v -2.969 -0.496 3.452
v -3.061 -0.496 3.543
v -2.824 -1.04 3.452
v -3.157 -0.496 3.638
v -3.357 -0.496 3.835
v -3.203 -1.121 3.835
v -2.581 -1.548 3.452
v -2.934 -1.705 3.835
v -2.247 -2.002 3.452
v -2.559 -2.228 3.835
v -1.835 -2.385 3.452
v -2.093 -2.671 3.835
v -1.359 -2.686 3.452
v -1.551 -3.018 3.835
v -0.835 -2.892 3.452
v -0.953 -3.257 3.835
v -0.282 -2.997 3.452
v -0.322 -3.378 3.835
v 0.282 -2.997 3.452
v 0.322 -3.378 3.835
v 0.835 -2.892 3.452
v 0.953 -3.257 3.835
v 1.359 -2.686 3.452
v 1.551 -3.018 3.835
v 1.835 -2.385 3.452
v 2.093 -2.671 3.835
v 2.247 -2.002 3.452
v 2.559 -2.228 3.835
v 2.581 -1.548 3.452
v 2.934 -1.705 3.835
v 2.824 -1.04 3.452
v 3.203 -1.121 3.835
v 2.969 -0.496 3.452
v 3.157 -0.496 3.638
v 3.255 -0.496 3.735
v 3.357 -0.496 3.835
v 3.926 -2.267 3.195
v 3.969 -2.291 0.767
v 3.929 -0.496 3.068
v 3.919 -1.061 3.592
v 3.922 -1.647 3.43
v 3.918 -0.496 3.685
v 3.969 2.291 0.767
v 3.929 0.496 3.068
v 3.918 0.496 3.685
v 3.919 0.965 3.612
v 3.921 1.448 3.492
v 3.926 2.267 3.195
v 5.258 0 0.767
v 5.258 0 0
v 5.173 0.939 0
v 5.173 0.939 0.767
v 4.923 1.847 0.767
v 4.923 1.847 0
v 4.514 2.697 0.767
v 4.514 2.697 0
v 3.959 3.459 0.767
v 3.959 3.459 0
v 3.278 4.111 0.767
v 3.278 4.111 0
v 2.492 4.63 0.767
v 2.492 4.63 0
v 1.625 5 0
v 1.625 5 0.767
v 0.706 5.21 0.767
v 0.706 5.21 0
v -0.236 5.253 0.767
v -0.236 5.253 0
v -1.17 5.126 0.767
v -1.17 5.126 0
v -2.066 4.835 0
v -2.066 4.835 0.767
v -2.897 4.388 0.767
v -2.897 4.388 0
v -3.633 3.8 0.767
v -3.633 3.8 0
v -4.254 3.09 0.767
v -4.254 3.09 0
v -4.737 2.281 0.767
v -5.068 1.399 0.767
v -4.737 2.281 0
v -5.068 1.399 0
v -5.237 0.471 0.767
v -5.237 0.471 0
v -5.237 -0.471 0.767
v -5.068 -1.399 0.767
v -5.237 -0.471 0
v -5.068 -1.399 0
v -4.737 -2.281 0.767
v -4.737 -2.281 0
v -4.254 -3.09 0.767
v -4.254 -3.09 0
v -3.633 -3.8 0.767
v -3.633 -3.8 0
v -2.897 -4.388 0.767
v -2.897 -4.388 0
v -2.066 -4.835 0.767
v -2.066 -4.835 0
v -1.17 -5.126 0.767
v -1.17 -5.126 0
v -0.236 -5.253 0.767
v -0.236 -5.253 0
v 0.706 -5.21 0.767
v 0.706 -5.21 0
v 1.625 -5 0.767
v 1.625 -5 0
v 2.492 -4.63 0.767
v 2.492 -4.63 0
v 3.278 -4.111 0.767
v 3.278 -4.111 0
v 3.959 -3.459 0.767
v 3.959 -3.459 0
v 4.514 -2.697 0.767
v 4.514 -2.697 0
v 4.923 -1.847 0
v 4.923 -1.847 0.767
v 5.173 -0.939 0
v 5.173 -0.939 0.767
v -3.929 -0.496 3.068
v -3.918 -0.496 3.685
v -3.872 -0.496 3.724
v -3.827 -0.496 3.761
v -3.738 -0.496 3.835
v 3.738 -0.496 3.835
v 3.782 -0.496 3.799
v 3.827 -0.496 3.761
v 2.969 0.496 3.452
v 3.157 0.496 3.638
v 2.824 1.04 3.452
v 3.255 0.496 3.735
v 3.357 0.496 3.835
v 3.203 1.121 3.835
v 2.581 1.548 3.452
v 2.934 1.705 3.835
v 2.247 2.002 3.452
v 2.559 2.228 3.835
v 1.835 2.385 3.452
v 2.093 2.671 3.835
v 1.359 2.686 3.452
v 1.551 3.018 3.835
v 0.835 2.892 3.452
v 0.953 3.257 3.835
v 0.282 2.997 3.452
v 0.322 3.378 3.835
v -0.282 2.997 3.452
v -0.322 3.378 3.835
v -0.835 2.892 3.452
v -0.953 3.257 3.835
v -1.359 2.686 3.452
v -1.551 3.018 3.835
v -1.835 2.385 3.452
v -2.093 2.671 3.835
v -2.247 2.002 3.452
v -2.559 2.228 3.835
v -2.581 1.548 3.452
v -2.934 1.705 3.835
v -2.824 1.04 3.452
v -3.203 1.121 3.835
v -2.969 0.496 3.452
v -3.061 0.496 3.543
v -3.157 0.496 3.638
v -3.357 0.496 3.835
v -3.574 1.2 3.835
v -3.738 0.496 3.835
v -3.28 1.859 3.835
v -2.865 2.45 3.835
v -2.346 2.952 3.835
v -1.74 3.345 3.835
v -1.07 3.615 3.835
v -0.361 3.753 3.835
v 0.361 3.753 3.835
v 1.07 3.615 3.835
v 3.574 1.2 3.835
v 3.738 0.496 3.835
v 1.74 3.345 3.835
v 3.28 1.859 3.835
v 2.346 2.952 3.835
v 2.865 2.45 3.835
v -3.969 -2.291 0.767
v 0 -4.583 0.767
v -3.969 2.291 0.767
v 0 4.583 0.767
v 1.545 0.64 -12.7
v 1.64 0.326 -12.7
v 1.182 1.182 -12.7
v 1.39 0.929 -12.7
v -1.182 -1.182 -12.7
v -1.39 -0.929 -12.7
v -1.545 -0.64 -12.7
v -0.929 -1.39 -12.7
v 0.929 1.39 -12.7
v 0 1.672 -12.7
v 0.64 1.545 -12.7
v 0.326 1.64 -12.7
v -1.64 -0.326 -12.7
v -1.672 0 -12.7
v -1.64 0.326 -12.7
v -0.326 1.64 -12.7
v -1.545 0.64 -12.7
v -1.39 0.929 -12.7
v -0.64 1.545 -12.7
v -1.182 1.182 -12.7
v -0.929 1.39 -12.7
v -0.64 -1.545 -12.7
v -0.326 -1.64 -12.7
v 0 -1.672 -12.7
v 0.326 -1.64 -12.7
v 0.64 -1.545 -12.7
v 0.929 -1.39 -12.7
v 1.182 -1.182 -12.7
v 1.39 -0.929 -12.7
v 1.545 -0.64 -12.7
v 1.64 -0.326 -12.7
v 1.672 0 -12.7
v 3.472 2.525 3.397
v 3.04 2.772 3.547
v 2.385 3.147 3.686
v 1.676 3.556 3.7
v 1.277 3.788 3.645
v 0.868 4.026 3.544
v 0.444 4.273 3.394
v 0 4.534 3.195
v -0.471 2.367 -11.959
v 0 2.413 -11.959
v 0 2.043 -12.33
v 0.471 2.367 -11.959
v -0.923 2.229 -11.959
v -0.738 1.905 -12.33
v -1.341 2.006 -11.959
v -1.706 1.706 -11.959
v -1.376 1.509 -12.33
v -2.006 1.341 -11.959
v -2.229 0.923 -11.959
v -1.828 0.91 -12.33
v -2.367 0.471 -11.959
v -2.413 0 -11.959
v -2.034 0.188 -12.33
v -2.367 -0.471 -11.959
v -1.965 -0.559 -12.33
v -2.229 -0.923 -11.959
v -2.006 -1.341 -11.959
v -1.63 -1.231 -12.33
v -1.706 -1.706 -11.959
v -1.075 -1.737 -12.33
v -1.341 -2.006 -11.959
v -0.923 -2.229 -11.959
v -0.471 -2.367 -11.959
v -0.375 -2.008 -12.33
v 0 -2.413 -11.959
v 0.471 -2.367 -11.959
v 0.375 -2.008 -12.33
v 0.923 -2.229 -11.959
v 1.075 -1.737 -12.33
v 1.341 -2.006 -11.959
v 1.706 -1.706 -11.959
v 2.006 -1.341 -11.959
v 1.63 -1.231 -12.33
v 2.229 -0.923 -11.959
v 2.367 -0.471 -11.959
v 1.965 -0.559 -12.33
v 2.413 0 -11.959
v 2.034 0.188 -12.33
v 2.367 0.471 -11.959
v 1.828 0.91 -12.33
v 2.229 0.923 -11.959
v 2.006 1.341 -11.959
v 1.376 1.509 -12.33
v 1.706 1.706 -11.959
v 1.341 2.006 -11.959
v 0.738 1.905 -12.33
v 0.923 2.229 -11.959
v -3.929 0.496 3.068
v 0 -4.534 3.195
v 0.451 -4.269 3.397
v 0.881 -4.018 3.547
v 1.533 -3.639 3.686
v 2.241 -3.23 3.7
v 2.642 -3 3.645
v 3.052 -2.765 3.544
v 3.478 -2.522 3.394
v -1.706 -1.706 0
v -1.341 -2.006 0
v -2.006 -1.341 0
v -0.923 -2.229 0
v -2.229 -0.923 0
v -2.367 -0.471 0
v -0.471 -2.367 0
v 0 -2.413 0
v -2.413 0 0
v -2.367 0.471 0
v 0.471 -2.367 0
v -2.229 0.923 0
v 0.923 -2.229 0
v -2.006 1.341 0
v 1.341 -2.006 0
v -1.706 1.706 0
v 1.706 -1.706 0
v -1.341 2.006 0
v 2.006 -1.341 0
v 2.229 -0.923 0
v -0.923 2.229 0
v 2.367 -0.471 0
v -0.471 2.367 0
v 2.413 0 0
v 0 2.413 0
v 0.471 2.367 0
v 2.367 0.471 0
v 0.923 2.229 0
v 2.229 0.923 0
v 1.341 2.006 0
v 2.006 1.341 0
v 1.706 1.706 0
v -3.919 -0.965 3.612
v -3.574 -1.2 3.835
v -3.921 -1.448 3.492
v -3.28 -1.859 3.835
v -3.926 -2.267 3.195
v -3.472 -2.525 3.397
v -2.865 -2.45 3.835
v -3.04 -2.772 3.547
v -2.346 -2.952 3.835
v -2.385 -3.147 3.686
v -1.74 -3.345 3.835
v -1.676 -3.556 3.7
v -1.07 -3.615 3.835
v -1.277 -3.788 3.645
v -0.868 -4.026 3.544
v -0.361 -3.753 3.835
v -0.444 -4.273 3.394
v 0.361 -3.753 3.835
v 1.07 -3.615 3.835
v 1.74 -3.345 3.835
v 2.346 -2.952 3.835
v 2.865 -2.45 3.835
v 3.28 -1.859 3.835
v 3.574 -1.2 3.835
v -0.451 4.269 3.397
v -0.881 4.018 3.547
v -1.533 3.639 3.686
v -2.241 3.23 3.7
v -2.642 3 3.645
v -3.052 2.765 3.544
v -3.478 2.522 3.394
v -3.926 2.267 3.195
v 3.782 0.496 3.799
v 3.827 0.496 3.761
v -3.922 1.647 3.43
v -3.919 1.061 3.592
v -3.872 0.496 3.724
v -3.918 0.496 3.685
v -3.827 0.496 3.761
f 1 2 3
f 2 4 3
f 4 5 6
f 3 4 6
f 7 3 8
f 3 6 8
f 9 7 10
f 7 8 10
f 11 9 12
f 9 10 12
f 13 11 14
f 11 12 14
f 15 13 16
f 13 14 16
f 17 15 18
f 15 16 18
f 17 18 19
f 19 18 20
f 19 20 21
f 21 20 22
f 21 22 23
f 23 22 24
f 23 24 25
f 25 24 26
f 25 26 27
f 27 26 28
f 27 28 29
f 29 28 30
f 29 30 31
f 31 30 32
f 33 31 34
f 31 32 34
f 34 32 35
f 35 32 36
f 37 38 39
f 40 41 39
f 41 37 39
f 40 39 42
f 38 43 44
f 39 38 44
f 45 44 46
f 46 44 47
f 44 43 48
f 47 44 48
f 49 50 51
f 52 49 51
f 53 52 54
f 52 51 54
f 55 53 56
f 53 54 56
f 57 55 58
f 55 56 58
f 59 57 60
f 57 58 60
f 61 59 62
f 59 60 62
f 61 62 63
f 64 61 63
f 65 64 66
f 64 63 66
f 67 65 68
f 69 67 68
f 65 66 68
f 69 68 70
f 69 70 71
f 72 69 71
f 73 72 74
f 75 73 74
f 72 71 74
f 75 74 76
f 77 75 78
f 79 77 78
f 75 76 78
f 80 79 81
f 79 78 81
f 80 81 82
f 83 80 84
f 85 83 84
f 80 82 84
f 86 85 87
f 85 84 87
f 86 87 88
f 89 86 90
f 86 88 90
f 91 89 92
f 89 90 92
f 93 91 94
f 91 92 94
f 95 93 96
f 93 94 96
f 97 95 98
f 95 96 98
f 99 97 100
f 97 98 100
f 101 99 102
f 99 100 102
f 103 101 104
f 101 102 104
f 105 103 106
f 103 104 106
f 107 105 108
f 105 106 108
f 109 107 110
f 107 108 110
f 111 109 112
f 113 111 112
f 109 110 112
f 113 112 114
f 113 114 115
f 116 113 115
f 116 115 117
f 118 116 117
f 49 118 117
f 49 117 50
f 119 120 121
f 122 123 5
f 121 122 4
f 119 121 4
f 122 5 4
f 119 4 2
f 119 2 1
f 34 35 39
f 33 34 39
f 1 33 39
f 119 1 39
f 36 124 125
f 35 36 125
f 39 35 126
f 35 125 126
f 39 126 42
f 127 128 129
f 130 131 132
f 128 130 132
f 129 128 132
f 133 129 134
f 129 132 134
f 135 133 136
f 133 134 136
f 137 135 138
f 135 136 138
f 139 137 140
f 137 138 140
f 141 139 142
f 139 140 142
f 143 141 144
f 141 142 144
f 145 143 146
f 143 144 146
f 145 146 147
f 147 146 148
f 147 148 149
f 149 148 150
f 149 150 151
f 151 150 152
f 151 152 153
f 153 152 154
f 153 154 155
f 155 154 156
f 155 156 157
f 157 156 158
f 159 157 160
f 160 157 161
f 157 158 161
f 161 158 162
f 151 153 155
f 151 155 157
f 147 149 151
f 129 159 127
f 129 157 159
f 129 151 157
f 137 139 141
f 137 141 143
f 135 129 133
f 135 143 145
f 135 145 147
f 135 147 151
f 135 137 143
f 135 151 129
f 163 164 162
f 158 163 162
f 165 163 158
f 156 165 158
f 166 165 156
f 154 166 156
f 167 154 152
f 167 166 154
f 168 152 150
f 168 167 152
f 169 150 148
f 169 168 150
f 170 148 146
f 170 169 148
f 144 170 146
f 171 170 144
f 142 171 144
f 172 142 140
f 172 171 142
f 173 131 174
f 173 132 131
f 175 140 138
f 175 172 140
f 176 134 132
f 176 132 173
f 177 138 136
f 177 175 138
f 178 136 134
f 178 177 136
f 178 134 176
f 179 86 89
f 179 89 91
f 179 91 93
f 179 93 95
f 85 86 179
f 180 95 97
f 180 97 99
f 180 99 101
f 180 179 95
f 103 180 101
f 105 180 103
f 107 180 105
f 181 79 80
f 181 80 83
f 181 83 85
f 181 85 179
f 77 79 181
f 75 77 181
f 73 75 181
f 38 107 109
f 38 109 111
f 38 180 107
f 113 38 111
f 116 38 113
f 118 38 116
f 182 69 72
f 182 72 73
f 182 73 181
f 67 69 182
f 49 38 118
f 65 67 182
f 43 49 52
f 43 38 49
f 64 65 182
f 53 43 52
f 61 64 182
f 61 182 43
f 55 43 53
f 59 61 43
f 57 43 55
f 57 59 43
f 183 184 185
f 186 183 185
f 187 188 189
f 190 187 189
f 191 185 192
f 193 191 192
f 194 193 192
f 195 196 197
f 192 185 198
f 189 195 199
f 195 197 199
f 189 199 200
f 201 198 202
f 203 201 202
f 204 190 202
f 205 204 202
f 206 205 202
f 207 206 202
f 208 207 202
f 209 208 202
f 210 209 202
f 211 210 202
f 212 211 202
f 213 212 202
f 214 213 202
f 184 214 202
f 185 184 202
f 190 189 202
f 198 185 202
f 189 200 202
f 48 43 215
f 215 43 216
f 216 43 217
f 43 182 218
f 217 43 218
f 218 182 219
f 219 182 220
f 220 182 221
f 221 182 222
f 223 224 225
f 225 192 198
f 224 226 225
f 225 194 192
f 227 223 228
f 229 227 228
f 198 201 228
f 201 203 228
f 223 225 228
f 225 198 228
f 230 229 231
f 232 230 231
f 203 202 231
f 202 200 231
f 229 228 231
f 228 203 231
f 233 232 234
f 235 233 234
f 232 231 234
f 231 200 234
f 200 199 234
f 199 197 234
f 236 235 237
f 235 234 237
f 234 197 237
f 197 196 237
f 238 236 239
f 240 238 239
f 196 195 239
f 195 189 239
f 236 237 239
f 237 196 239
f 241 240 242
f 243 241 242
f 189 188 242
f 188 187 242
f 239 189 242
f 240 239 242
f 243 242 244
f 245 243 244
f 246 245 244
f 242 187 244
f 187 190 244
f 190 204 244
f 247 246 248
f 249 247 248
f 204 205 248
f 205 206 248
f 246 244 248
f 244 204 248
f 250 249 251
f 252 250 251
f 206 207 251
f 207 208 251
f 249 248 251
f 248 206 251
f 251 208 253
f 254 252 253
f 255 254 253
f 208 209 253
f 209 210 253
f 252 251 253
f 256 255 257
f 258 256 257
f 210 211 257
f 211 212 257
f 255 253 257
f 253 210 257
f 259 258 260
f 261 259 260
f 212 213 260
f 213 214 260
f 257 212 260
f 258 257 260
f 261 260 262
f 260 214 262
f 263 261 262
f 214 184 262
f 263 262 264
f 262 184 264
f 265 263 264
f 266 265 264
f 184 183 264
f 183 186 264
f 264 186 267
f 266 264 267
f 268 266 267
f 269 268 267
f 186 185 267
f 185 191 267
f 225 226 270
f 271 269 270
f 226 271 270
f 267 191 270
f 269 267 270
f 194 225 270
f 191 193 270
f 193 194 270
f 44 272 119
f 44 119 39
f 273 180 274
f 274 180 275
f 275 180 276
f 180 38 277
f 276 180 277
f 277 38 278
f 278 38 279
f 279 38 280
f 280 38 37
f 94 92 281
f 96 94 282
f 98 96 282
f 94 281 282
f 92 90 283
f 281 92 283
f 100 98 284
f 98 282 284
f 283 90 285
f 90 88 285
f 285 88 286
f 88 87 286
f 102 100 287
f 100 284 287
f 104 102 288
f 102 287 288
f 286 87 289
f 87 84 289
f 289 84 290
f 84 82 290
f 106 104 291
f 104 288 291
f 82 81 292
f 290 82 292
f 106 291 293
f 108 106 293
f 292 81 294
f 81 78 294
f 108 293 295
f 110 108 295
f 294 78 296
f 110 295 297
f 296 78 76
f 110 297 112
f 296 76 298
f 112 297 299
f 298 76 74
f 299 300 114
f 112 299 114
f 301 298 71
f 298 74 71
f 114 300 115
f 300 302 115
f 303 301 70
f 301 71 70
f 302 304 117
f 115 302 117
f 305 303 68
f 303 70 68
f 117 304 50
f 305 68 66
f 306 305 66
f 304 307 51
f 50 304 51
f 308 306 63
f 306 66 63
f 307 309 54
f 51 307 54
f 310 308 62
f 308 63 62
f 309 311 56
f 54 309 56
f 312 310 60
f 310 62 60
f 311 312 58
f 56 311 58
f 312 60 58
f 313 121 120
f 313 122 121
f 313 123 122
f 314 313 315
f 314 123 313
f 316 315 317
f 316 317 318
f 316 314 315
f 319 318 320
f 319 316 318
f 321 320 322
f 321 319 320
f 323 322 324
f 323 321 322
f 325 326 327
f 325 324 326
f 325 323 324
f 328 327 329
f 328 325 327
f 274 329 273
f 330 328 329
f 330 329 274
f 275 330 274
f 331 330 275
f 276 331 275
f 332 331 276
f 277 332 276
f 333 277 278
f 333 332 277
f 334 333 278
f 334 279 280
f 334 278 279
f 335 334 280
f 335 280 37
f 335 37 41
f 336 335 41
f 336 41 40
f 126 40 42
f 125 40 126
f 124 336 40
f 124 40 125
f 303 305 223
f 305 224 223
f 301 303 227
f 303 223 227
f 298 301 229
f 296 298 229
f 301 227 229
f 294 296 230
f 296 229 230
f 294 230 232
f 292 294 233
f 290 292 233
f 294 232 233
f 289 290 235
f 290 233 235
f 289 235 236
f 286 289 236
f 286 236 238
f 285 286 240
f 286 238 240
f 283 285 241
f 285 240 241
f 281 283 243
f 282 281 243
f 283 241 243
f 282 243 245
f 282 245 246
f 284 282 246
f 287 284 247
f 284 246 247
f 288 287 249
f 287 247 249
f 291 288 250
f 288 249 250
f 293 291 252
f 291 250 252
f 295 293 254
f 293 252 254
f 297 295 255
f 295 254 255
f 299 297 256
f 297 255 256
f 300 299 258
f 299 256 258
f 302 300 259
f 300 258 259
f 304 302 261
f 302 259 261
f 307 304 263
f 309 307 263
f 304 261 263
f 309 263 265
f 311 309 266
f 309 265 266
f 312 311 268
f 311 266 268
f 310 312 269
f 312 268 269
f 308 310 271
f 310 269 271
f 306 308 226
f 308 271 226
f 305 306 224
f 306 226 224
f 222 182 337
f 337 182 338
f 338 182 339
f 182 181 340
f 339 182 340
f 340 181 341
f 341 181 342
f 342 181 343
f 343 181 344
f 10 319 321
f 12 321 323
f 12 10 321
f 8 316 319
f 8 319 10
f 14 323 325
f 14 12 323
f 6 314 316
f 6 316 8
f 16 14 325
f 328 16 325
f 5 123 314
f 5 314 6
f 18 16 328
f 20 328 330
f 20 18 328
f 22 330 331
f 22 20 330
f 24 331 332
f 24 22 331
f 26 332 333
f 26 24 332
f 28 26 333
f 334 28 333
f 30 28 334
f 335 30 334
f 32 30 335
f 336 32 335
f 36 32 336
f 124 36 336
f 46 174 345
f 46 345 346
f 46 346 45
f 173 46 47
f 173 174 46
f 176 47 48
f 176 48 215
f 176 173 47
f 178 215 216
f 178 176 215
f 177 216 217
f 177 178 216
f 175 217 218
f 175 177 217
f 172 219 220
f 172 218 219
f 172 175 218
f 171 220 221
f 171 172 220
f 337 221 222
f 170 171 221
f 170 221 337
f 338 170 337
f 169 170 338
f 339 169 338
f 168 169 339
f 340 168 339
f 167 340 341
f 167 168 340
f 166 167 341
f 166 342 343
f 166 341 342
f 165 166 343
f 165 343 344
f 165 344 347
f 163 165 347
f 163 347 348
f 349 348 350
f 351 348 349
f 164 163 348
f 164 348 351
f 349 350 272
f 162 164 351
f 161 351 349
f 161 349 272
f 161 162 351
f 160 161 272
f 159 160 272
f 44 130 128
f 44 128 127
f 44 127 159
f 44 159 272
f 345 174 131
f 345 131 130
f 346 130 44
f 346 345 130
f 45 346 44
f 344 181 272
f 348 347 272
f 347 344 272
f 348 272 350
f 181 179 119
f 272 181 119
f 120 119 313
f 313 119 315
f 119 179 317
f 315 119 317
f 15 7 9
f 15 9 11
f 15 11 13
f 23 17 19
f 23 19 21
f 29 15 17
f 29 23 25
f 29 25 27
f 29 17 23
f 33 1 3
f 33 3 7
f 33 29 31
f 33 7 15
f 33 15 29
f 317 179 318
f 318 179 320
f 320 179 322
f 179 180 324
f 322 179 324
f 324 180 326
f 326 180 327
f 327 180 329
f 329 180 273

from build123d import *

# Parameters (mm, degrees)
SKETCH3_R           = 5.2578
BOSS_EXTRUDE1_DEPTH = 0.76708
BOSS_EXTRUDE2_DEPTH = 3.06832
BOSS_EXTRUDE2_TAPER = 1
SKETCH5_OUTSIDE_W   = 62.562
SKETCH5_OUTSIDE_H   = 62.562
SKETCH5_OUTSIDE_R   = 3.7703125
CUT_EXTRUDE1_DEPTH  = 19.130316457
CUT_EXTRUDE1_DRAFT  = -50
SKETCH6_R           = 3.39328125
CUT_EXTRUDE2_DEPTH  = 0.38354
CUT_EXTRUDE2_DRAFT  = -45
CUT_EXTRUDE3_START  = 3.8354
SKETCH10_W          = 8.334375
SKETCH10_H          = 0.9921875
CUT_EXTRUDE3_DEPTH  = 0.76708


with BuildPart() as part:
    # Sketch2 → Revolve1 (revolve)
    with BuildSketch(Plane(origin=(0, 0, 0), x_dir=(0, 0, -1), z_dir=(1, 0, 0))):
        Polygon((0, 0), (0, 2.413), (11.959166667, 2.413), (12.7, 1.672166667), (12.7, 0), align=None)
    revolve(axis=Axis((0, 0, -12.7), (0, 0, 1)))

    # Sketch3 → Boss-Extrude1 (add)
    with BuildSketch(Plane.XY):
        Circle(SKETCH3_R)
    extrude(amount=BOSS_EXTRUDE1_DEPTH)

    # Sketch4 → Boss-Extrude2 (add)
    with BuildSketch(Plane.XY.offset(0.76708)):
        Polygon((-3.96875, 2.291358881), (-3.96875, -2.291358881), (0, -4.582717762), (3.96875, -2.291358881), (3.96875, 2.291358881), (0, 4.582717762), align=None)
    extrude(amount=BOSS_EXTRUDE2_DEPTH, taper=BOSS_EXTRUDE2_TAPER)


with BuildPart() as cut_extrude1_tool:
    # Sketch5 outside → Cut-Extrude1 (with draft: the straight prism first)
    with BuildSketch(Plane.XY.offset(3.8354)):
        Rectangle(SKETCH5_OUTSIDE_W, SKETCH5_OUTSIDE_H)
        Circle(SKETCH5_OUTSIDE_R, mode=Mode.SUBTRACT)
    extrude(amount=-CUT_EXTRUDE1_DEPTH)
    # Cut-Extrude1: the draft: its side faces are tilted about the plane it starts from
    cut_extrude1_sides = [cut_extrude1_tool.faces().sort_by_distance(p)[0] for p in [
        (0, -31.281, -5.729758229),
        (31.281, 0, -5.729758229),
        (0, 31.281, -5.729758229),
        (-31.281, 0, -5.729758229),
        (-3.7703125, 0, -5.729758229),
    ]]
    draft(cut_extrude1_sides, Plane.XY.offset(3.8354), CUT_EXTRUDE1_DRAFT)


with BuildPart() as part_1:
    add(part.part)

    # Cut-Extrude1: cut by cut_extrude1_tool
    add(cut_extrude1_tool.part, mode=Mode.SUBTRACT)


with BuildPart() as cut_extrude2_tool:
    # Sketch6 → Cut-Extrude2 (with draft: the straight prism first)
    with BuildSketch(Plane.XY.offset(3.8354)):
        Circle(SKETCH6_R)
    extrude(amount=-CUT_EXTRUDE2_DEPTH)
    # Cut-Extrude2: the draft: its side faces are tilted about the plane it starts from
    cut_extrude2_sides = [cut_extrude2_tool.faces().sort_by_distance(p)[0] for p in [
        (-3.39328125, 0, 3.64363),
    ]]
    draft(cut_extrude2_sides, Plane.XY.offset(3.8354), CUT_EXTRUDE2_DRAFT)


with BuildPart() as part_2:
    add(part_1.part)

    # Cut-Extrude2: cut by cut_extrude2_tool
    add(cut_extrude2_tool.part, mode=Mode.SUBTRACT)

    # Sketch10 → Cut-Extrude3 (cut)
    with BuildSketch(Plane.XY.offset(CUT_EXTRUDE3_START)):
        Rectangle(SKETCH10_W, SKETCH10_H)
    extrude(amount=-CUT_EXTRUDE3_DEPTH, mode=Mode.SUBTRACT)


solid = part_2.part
